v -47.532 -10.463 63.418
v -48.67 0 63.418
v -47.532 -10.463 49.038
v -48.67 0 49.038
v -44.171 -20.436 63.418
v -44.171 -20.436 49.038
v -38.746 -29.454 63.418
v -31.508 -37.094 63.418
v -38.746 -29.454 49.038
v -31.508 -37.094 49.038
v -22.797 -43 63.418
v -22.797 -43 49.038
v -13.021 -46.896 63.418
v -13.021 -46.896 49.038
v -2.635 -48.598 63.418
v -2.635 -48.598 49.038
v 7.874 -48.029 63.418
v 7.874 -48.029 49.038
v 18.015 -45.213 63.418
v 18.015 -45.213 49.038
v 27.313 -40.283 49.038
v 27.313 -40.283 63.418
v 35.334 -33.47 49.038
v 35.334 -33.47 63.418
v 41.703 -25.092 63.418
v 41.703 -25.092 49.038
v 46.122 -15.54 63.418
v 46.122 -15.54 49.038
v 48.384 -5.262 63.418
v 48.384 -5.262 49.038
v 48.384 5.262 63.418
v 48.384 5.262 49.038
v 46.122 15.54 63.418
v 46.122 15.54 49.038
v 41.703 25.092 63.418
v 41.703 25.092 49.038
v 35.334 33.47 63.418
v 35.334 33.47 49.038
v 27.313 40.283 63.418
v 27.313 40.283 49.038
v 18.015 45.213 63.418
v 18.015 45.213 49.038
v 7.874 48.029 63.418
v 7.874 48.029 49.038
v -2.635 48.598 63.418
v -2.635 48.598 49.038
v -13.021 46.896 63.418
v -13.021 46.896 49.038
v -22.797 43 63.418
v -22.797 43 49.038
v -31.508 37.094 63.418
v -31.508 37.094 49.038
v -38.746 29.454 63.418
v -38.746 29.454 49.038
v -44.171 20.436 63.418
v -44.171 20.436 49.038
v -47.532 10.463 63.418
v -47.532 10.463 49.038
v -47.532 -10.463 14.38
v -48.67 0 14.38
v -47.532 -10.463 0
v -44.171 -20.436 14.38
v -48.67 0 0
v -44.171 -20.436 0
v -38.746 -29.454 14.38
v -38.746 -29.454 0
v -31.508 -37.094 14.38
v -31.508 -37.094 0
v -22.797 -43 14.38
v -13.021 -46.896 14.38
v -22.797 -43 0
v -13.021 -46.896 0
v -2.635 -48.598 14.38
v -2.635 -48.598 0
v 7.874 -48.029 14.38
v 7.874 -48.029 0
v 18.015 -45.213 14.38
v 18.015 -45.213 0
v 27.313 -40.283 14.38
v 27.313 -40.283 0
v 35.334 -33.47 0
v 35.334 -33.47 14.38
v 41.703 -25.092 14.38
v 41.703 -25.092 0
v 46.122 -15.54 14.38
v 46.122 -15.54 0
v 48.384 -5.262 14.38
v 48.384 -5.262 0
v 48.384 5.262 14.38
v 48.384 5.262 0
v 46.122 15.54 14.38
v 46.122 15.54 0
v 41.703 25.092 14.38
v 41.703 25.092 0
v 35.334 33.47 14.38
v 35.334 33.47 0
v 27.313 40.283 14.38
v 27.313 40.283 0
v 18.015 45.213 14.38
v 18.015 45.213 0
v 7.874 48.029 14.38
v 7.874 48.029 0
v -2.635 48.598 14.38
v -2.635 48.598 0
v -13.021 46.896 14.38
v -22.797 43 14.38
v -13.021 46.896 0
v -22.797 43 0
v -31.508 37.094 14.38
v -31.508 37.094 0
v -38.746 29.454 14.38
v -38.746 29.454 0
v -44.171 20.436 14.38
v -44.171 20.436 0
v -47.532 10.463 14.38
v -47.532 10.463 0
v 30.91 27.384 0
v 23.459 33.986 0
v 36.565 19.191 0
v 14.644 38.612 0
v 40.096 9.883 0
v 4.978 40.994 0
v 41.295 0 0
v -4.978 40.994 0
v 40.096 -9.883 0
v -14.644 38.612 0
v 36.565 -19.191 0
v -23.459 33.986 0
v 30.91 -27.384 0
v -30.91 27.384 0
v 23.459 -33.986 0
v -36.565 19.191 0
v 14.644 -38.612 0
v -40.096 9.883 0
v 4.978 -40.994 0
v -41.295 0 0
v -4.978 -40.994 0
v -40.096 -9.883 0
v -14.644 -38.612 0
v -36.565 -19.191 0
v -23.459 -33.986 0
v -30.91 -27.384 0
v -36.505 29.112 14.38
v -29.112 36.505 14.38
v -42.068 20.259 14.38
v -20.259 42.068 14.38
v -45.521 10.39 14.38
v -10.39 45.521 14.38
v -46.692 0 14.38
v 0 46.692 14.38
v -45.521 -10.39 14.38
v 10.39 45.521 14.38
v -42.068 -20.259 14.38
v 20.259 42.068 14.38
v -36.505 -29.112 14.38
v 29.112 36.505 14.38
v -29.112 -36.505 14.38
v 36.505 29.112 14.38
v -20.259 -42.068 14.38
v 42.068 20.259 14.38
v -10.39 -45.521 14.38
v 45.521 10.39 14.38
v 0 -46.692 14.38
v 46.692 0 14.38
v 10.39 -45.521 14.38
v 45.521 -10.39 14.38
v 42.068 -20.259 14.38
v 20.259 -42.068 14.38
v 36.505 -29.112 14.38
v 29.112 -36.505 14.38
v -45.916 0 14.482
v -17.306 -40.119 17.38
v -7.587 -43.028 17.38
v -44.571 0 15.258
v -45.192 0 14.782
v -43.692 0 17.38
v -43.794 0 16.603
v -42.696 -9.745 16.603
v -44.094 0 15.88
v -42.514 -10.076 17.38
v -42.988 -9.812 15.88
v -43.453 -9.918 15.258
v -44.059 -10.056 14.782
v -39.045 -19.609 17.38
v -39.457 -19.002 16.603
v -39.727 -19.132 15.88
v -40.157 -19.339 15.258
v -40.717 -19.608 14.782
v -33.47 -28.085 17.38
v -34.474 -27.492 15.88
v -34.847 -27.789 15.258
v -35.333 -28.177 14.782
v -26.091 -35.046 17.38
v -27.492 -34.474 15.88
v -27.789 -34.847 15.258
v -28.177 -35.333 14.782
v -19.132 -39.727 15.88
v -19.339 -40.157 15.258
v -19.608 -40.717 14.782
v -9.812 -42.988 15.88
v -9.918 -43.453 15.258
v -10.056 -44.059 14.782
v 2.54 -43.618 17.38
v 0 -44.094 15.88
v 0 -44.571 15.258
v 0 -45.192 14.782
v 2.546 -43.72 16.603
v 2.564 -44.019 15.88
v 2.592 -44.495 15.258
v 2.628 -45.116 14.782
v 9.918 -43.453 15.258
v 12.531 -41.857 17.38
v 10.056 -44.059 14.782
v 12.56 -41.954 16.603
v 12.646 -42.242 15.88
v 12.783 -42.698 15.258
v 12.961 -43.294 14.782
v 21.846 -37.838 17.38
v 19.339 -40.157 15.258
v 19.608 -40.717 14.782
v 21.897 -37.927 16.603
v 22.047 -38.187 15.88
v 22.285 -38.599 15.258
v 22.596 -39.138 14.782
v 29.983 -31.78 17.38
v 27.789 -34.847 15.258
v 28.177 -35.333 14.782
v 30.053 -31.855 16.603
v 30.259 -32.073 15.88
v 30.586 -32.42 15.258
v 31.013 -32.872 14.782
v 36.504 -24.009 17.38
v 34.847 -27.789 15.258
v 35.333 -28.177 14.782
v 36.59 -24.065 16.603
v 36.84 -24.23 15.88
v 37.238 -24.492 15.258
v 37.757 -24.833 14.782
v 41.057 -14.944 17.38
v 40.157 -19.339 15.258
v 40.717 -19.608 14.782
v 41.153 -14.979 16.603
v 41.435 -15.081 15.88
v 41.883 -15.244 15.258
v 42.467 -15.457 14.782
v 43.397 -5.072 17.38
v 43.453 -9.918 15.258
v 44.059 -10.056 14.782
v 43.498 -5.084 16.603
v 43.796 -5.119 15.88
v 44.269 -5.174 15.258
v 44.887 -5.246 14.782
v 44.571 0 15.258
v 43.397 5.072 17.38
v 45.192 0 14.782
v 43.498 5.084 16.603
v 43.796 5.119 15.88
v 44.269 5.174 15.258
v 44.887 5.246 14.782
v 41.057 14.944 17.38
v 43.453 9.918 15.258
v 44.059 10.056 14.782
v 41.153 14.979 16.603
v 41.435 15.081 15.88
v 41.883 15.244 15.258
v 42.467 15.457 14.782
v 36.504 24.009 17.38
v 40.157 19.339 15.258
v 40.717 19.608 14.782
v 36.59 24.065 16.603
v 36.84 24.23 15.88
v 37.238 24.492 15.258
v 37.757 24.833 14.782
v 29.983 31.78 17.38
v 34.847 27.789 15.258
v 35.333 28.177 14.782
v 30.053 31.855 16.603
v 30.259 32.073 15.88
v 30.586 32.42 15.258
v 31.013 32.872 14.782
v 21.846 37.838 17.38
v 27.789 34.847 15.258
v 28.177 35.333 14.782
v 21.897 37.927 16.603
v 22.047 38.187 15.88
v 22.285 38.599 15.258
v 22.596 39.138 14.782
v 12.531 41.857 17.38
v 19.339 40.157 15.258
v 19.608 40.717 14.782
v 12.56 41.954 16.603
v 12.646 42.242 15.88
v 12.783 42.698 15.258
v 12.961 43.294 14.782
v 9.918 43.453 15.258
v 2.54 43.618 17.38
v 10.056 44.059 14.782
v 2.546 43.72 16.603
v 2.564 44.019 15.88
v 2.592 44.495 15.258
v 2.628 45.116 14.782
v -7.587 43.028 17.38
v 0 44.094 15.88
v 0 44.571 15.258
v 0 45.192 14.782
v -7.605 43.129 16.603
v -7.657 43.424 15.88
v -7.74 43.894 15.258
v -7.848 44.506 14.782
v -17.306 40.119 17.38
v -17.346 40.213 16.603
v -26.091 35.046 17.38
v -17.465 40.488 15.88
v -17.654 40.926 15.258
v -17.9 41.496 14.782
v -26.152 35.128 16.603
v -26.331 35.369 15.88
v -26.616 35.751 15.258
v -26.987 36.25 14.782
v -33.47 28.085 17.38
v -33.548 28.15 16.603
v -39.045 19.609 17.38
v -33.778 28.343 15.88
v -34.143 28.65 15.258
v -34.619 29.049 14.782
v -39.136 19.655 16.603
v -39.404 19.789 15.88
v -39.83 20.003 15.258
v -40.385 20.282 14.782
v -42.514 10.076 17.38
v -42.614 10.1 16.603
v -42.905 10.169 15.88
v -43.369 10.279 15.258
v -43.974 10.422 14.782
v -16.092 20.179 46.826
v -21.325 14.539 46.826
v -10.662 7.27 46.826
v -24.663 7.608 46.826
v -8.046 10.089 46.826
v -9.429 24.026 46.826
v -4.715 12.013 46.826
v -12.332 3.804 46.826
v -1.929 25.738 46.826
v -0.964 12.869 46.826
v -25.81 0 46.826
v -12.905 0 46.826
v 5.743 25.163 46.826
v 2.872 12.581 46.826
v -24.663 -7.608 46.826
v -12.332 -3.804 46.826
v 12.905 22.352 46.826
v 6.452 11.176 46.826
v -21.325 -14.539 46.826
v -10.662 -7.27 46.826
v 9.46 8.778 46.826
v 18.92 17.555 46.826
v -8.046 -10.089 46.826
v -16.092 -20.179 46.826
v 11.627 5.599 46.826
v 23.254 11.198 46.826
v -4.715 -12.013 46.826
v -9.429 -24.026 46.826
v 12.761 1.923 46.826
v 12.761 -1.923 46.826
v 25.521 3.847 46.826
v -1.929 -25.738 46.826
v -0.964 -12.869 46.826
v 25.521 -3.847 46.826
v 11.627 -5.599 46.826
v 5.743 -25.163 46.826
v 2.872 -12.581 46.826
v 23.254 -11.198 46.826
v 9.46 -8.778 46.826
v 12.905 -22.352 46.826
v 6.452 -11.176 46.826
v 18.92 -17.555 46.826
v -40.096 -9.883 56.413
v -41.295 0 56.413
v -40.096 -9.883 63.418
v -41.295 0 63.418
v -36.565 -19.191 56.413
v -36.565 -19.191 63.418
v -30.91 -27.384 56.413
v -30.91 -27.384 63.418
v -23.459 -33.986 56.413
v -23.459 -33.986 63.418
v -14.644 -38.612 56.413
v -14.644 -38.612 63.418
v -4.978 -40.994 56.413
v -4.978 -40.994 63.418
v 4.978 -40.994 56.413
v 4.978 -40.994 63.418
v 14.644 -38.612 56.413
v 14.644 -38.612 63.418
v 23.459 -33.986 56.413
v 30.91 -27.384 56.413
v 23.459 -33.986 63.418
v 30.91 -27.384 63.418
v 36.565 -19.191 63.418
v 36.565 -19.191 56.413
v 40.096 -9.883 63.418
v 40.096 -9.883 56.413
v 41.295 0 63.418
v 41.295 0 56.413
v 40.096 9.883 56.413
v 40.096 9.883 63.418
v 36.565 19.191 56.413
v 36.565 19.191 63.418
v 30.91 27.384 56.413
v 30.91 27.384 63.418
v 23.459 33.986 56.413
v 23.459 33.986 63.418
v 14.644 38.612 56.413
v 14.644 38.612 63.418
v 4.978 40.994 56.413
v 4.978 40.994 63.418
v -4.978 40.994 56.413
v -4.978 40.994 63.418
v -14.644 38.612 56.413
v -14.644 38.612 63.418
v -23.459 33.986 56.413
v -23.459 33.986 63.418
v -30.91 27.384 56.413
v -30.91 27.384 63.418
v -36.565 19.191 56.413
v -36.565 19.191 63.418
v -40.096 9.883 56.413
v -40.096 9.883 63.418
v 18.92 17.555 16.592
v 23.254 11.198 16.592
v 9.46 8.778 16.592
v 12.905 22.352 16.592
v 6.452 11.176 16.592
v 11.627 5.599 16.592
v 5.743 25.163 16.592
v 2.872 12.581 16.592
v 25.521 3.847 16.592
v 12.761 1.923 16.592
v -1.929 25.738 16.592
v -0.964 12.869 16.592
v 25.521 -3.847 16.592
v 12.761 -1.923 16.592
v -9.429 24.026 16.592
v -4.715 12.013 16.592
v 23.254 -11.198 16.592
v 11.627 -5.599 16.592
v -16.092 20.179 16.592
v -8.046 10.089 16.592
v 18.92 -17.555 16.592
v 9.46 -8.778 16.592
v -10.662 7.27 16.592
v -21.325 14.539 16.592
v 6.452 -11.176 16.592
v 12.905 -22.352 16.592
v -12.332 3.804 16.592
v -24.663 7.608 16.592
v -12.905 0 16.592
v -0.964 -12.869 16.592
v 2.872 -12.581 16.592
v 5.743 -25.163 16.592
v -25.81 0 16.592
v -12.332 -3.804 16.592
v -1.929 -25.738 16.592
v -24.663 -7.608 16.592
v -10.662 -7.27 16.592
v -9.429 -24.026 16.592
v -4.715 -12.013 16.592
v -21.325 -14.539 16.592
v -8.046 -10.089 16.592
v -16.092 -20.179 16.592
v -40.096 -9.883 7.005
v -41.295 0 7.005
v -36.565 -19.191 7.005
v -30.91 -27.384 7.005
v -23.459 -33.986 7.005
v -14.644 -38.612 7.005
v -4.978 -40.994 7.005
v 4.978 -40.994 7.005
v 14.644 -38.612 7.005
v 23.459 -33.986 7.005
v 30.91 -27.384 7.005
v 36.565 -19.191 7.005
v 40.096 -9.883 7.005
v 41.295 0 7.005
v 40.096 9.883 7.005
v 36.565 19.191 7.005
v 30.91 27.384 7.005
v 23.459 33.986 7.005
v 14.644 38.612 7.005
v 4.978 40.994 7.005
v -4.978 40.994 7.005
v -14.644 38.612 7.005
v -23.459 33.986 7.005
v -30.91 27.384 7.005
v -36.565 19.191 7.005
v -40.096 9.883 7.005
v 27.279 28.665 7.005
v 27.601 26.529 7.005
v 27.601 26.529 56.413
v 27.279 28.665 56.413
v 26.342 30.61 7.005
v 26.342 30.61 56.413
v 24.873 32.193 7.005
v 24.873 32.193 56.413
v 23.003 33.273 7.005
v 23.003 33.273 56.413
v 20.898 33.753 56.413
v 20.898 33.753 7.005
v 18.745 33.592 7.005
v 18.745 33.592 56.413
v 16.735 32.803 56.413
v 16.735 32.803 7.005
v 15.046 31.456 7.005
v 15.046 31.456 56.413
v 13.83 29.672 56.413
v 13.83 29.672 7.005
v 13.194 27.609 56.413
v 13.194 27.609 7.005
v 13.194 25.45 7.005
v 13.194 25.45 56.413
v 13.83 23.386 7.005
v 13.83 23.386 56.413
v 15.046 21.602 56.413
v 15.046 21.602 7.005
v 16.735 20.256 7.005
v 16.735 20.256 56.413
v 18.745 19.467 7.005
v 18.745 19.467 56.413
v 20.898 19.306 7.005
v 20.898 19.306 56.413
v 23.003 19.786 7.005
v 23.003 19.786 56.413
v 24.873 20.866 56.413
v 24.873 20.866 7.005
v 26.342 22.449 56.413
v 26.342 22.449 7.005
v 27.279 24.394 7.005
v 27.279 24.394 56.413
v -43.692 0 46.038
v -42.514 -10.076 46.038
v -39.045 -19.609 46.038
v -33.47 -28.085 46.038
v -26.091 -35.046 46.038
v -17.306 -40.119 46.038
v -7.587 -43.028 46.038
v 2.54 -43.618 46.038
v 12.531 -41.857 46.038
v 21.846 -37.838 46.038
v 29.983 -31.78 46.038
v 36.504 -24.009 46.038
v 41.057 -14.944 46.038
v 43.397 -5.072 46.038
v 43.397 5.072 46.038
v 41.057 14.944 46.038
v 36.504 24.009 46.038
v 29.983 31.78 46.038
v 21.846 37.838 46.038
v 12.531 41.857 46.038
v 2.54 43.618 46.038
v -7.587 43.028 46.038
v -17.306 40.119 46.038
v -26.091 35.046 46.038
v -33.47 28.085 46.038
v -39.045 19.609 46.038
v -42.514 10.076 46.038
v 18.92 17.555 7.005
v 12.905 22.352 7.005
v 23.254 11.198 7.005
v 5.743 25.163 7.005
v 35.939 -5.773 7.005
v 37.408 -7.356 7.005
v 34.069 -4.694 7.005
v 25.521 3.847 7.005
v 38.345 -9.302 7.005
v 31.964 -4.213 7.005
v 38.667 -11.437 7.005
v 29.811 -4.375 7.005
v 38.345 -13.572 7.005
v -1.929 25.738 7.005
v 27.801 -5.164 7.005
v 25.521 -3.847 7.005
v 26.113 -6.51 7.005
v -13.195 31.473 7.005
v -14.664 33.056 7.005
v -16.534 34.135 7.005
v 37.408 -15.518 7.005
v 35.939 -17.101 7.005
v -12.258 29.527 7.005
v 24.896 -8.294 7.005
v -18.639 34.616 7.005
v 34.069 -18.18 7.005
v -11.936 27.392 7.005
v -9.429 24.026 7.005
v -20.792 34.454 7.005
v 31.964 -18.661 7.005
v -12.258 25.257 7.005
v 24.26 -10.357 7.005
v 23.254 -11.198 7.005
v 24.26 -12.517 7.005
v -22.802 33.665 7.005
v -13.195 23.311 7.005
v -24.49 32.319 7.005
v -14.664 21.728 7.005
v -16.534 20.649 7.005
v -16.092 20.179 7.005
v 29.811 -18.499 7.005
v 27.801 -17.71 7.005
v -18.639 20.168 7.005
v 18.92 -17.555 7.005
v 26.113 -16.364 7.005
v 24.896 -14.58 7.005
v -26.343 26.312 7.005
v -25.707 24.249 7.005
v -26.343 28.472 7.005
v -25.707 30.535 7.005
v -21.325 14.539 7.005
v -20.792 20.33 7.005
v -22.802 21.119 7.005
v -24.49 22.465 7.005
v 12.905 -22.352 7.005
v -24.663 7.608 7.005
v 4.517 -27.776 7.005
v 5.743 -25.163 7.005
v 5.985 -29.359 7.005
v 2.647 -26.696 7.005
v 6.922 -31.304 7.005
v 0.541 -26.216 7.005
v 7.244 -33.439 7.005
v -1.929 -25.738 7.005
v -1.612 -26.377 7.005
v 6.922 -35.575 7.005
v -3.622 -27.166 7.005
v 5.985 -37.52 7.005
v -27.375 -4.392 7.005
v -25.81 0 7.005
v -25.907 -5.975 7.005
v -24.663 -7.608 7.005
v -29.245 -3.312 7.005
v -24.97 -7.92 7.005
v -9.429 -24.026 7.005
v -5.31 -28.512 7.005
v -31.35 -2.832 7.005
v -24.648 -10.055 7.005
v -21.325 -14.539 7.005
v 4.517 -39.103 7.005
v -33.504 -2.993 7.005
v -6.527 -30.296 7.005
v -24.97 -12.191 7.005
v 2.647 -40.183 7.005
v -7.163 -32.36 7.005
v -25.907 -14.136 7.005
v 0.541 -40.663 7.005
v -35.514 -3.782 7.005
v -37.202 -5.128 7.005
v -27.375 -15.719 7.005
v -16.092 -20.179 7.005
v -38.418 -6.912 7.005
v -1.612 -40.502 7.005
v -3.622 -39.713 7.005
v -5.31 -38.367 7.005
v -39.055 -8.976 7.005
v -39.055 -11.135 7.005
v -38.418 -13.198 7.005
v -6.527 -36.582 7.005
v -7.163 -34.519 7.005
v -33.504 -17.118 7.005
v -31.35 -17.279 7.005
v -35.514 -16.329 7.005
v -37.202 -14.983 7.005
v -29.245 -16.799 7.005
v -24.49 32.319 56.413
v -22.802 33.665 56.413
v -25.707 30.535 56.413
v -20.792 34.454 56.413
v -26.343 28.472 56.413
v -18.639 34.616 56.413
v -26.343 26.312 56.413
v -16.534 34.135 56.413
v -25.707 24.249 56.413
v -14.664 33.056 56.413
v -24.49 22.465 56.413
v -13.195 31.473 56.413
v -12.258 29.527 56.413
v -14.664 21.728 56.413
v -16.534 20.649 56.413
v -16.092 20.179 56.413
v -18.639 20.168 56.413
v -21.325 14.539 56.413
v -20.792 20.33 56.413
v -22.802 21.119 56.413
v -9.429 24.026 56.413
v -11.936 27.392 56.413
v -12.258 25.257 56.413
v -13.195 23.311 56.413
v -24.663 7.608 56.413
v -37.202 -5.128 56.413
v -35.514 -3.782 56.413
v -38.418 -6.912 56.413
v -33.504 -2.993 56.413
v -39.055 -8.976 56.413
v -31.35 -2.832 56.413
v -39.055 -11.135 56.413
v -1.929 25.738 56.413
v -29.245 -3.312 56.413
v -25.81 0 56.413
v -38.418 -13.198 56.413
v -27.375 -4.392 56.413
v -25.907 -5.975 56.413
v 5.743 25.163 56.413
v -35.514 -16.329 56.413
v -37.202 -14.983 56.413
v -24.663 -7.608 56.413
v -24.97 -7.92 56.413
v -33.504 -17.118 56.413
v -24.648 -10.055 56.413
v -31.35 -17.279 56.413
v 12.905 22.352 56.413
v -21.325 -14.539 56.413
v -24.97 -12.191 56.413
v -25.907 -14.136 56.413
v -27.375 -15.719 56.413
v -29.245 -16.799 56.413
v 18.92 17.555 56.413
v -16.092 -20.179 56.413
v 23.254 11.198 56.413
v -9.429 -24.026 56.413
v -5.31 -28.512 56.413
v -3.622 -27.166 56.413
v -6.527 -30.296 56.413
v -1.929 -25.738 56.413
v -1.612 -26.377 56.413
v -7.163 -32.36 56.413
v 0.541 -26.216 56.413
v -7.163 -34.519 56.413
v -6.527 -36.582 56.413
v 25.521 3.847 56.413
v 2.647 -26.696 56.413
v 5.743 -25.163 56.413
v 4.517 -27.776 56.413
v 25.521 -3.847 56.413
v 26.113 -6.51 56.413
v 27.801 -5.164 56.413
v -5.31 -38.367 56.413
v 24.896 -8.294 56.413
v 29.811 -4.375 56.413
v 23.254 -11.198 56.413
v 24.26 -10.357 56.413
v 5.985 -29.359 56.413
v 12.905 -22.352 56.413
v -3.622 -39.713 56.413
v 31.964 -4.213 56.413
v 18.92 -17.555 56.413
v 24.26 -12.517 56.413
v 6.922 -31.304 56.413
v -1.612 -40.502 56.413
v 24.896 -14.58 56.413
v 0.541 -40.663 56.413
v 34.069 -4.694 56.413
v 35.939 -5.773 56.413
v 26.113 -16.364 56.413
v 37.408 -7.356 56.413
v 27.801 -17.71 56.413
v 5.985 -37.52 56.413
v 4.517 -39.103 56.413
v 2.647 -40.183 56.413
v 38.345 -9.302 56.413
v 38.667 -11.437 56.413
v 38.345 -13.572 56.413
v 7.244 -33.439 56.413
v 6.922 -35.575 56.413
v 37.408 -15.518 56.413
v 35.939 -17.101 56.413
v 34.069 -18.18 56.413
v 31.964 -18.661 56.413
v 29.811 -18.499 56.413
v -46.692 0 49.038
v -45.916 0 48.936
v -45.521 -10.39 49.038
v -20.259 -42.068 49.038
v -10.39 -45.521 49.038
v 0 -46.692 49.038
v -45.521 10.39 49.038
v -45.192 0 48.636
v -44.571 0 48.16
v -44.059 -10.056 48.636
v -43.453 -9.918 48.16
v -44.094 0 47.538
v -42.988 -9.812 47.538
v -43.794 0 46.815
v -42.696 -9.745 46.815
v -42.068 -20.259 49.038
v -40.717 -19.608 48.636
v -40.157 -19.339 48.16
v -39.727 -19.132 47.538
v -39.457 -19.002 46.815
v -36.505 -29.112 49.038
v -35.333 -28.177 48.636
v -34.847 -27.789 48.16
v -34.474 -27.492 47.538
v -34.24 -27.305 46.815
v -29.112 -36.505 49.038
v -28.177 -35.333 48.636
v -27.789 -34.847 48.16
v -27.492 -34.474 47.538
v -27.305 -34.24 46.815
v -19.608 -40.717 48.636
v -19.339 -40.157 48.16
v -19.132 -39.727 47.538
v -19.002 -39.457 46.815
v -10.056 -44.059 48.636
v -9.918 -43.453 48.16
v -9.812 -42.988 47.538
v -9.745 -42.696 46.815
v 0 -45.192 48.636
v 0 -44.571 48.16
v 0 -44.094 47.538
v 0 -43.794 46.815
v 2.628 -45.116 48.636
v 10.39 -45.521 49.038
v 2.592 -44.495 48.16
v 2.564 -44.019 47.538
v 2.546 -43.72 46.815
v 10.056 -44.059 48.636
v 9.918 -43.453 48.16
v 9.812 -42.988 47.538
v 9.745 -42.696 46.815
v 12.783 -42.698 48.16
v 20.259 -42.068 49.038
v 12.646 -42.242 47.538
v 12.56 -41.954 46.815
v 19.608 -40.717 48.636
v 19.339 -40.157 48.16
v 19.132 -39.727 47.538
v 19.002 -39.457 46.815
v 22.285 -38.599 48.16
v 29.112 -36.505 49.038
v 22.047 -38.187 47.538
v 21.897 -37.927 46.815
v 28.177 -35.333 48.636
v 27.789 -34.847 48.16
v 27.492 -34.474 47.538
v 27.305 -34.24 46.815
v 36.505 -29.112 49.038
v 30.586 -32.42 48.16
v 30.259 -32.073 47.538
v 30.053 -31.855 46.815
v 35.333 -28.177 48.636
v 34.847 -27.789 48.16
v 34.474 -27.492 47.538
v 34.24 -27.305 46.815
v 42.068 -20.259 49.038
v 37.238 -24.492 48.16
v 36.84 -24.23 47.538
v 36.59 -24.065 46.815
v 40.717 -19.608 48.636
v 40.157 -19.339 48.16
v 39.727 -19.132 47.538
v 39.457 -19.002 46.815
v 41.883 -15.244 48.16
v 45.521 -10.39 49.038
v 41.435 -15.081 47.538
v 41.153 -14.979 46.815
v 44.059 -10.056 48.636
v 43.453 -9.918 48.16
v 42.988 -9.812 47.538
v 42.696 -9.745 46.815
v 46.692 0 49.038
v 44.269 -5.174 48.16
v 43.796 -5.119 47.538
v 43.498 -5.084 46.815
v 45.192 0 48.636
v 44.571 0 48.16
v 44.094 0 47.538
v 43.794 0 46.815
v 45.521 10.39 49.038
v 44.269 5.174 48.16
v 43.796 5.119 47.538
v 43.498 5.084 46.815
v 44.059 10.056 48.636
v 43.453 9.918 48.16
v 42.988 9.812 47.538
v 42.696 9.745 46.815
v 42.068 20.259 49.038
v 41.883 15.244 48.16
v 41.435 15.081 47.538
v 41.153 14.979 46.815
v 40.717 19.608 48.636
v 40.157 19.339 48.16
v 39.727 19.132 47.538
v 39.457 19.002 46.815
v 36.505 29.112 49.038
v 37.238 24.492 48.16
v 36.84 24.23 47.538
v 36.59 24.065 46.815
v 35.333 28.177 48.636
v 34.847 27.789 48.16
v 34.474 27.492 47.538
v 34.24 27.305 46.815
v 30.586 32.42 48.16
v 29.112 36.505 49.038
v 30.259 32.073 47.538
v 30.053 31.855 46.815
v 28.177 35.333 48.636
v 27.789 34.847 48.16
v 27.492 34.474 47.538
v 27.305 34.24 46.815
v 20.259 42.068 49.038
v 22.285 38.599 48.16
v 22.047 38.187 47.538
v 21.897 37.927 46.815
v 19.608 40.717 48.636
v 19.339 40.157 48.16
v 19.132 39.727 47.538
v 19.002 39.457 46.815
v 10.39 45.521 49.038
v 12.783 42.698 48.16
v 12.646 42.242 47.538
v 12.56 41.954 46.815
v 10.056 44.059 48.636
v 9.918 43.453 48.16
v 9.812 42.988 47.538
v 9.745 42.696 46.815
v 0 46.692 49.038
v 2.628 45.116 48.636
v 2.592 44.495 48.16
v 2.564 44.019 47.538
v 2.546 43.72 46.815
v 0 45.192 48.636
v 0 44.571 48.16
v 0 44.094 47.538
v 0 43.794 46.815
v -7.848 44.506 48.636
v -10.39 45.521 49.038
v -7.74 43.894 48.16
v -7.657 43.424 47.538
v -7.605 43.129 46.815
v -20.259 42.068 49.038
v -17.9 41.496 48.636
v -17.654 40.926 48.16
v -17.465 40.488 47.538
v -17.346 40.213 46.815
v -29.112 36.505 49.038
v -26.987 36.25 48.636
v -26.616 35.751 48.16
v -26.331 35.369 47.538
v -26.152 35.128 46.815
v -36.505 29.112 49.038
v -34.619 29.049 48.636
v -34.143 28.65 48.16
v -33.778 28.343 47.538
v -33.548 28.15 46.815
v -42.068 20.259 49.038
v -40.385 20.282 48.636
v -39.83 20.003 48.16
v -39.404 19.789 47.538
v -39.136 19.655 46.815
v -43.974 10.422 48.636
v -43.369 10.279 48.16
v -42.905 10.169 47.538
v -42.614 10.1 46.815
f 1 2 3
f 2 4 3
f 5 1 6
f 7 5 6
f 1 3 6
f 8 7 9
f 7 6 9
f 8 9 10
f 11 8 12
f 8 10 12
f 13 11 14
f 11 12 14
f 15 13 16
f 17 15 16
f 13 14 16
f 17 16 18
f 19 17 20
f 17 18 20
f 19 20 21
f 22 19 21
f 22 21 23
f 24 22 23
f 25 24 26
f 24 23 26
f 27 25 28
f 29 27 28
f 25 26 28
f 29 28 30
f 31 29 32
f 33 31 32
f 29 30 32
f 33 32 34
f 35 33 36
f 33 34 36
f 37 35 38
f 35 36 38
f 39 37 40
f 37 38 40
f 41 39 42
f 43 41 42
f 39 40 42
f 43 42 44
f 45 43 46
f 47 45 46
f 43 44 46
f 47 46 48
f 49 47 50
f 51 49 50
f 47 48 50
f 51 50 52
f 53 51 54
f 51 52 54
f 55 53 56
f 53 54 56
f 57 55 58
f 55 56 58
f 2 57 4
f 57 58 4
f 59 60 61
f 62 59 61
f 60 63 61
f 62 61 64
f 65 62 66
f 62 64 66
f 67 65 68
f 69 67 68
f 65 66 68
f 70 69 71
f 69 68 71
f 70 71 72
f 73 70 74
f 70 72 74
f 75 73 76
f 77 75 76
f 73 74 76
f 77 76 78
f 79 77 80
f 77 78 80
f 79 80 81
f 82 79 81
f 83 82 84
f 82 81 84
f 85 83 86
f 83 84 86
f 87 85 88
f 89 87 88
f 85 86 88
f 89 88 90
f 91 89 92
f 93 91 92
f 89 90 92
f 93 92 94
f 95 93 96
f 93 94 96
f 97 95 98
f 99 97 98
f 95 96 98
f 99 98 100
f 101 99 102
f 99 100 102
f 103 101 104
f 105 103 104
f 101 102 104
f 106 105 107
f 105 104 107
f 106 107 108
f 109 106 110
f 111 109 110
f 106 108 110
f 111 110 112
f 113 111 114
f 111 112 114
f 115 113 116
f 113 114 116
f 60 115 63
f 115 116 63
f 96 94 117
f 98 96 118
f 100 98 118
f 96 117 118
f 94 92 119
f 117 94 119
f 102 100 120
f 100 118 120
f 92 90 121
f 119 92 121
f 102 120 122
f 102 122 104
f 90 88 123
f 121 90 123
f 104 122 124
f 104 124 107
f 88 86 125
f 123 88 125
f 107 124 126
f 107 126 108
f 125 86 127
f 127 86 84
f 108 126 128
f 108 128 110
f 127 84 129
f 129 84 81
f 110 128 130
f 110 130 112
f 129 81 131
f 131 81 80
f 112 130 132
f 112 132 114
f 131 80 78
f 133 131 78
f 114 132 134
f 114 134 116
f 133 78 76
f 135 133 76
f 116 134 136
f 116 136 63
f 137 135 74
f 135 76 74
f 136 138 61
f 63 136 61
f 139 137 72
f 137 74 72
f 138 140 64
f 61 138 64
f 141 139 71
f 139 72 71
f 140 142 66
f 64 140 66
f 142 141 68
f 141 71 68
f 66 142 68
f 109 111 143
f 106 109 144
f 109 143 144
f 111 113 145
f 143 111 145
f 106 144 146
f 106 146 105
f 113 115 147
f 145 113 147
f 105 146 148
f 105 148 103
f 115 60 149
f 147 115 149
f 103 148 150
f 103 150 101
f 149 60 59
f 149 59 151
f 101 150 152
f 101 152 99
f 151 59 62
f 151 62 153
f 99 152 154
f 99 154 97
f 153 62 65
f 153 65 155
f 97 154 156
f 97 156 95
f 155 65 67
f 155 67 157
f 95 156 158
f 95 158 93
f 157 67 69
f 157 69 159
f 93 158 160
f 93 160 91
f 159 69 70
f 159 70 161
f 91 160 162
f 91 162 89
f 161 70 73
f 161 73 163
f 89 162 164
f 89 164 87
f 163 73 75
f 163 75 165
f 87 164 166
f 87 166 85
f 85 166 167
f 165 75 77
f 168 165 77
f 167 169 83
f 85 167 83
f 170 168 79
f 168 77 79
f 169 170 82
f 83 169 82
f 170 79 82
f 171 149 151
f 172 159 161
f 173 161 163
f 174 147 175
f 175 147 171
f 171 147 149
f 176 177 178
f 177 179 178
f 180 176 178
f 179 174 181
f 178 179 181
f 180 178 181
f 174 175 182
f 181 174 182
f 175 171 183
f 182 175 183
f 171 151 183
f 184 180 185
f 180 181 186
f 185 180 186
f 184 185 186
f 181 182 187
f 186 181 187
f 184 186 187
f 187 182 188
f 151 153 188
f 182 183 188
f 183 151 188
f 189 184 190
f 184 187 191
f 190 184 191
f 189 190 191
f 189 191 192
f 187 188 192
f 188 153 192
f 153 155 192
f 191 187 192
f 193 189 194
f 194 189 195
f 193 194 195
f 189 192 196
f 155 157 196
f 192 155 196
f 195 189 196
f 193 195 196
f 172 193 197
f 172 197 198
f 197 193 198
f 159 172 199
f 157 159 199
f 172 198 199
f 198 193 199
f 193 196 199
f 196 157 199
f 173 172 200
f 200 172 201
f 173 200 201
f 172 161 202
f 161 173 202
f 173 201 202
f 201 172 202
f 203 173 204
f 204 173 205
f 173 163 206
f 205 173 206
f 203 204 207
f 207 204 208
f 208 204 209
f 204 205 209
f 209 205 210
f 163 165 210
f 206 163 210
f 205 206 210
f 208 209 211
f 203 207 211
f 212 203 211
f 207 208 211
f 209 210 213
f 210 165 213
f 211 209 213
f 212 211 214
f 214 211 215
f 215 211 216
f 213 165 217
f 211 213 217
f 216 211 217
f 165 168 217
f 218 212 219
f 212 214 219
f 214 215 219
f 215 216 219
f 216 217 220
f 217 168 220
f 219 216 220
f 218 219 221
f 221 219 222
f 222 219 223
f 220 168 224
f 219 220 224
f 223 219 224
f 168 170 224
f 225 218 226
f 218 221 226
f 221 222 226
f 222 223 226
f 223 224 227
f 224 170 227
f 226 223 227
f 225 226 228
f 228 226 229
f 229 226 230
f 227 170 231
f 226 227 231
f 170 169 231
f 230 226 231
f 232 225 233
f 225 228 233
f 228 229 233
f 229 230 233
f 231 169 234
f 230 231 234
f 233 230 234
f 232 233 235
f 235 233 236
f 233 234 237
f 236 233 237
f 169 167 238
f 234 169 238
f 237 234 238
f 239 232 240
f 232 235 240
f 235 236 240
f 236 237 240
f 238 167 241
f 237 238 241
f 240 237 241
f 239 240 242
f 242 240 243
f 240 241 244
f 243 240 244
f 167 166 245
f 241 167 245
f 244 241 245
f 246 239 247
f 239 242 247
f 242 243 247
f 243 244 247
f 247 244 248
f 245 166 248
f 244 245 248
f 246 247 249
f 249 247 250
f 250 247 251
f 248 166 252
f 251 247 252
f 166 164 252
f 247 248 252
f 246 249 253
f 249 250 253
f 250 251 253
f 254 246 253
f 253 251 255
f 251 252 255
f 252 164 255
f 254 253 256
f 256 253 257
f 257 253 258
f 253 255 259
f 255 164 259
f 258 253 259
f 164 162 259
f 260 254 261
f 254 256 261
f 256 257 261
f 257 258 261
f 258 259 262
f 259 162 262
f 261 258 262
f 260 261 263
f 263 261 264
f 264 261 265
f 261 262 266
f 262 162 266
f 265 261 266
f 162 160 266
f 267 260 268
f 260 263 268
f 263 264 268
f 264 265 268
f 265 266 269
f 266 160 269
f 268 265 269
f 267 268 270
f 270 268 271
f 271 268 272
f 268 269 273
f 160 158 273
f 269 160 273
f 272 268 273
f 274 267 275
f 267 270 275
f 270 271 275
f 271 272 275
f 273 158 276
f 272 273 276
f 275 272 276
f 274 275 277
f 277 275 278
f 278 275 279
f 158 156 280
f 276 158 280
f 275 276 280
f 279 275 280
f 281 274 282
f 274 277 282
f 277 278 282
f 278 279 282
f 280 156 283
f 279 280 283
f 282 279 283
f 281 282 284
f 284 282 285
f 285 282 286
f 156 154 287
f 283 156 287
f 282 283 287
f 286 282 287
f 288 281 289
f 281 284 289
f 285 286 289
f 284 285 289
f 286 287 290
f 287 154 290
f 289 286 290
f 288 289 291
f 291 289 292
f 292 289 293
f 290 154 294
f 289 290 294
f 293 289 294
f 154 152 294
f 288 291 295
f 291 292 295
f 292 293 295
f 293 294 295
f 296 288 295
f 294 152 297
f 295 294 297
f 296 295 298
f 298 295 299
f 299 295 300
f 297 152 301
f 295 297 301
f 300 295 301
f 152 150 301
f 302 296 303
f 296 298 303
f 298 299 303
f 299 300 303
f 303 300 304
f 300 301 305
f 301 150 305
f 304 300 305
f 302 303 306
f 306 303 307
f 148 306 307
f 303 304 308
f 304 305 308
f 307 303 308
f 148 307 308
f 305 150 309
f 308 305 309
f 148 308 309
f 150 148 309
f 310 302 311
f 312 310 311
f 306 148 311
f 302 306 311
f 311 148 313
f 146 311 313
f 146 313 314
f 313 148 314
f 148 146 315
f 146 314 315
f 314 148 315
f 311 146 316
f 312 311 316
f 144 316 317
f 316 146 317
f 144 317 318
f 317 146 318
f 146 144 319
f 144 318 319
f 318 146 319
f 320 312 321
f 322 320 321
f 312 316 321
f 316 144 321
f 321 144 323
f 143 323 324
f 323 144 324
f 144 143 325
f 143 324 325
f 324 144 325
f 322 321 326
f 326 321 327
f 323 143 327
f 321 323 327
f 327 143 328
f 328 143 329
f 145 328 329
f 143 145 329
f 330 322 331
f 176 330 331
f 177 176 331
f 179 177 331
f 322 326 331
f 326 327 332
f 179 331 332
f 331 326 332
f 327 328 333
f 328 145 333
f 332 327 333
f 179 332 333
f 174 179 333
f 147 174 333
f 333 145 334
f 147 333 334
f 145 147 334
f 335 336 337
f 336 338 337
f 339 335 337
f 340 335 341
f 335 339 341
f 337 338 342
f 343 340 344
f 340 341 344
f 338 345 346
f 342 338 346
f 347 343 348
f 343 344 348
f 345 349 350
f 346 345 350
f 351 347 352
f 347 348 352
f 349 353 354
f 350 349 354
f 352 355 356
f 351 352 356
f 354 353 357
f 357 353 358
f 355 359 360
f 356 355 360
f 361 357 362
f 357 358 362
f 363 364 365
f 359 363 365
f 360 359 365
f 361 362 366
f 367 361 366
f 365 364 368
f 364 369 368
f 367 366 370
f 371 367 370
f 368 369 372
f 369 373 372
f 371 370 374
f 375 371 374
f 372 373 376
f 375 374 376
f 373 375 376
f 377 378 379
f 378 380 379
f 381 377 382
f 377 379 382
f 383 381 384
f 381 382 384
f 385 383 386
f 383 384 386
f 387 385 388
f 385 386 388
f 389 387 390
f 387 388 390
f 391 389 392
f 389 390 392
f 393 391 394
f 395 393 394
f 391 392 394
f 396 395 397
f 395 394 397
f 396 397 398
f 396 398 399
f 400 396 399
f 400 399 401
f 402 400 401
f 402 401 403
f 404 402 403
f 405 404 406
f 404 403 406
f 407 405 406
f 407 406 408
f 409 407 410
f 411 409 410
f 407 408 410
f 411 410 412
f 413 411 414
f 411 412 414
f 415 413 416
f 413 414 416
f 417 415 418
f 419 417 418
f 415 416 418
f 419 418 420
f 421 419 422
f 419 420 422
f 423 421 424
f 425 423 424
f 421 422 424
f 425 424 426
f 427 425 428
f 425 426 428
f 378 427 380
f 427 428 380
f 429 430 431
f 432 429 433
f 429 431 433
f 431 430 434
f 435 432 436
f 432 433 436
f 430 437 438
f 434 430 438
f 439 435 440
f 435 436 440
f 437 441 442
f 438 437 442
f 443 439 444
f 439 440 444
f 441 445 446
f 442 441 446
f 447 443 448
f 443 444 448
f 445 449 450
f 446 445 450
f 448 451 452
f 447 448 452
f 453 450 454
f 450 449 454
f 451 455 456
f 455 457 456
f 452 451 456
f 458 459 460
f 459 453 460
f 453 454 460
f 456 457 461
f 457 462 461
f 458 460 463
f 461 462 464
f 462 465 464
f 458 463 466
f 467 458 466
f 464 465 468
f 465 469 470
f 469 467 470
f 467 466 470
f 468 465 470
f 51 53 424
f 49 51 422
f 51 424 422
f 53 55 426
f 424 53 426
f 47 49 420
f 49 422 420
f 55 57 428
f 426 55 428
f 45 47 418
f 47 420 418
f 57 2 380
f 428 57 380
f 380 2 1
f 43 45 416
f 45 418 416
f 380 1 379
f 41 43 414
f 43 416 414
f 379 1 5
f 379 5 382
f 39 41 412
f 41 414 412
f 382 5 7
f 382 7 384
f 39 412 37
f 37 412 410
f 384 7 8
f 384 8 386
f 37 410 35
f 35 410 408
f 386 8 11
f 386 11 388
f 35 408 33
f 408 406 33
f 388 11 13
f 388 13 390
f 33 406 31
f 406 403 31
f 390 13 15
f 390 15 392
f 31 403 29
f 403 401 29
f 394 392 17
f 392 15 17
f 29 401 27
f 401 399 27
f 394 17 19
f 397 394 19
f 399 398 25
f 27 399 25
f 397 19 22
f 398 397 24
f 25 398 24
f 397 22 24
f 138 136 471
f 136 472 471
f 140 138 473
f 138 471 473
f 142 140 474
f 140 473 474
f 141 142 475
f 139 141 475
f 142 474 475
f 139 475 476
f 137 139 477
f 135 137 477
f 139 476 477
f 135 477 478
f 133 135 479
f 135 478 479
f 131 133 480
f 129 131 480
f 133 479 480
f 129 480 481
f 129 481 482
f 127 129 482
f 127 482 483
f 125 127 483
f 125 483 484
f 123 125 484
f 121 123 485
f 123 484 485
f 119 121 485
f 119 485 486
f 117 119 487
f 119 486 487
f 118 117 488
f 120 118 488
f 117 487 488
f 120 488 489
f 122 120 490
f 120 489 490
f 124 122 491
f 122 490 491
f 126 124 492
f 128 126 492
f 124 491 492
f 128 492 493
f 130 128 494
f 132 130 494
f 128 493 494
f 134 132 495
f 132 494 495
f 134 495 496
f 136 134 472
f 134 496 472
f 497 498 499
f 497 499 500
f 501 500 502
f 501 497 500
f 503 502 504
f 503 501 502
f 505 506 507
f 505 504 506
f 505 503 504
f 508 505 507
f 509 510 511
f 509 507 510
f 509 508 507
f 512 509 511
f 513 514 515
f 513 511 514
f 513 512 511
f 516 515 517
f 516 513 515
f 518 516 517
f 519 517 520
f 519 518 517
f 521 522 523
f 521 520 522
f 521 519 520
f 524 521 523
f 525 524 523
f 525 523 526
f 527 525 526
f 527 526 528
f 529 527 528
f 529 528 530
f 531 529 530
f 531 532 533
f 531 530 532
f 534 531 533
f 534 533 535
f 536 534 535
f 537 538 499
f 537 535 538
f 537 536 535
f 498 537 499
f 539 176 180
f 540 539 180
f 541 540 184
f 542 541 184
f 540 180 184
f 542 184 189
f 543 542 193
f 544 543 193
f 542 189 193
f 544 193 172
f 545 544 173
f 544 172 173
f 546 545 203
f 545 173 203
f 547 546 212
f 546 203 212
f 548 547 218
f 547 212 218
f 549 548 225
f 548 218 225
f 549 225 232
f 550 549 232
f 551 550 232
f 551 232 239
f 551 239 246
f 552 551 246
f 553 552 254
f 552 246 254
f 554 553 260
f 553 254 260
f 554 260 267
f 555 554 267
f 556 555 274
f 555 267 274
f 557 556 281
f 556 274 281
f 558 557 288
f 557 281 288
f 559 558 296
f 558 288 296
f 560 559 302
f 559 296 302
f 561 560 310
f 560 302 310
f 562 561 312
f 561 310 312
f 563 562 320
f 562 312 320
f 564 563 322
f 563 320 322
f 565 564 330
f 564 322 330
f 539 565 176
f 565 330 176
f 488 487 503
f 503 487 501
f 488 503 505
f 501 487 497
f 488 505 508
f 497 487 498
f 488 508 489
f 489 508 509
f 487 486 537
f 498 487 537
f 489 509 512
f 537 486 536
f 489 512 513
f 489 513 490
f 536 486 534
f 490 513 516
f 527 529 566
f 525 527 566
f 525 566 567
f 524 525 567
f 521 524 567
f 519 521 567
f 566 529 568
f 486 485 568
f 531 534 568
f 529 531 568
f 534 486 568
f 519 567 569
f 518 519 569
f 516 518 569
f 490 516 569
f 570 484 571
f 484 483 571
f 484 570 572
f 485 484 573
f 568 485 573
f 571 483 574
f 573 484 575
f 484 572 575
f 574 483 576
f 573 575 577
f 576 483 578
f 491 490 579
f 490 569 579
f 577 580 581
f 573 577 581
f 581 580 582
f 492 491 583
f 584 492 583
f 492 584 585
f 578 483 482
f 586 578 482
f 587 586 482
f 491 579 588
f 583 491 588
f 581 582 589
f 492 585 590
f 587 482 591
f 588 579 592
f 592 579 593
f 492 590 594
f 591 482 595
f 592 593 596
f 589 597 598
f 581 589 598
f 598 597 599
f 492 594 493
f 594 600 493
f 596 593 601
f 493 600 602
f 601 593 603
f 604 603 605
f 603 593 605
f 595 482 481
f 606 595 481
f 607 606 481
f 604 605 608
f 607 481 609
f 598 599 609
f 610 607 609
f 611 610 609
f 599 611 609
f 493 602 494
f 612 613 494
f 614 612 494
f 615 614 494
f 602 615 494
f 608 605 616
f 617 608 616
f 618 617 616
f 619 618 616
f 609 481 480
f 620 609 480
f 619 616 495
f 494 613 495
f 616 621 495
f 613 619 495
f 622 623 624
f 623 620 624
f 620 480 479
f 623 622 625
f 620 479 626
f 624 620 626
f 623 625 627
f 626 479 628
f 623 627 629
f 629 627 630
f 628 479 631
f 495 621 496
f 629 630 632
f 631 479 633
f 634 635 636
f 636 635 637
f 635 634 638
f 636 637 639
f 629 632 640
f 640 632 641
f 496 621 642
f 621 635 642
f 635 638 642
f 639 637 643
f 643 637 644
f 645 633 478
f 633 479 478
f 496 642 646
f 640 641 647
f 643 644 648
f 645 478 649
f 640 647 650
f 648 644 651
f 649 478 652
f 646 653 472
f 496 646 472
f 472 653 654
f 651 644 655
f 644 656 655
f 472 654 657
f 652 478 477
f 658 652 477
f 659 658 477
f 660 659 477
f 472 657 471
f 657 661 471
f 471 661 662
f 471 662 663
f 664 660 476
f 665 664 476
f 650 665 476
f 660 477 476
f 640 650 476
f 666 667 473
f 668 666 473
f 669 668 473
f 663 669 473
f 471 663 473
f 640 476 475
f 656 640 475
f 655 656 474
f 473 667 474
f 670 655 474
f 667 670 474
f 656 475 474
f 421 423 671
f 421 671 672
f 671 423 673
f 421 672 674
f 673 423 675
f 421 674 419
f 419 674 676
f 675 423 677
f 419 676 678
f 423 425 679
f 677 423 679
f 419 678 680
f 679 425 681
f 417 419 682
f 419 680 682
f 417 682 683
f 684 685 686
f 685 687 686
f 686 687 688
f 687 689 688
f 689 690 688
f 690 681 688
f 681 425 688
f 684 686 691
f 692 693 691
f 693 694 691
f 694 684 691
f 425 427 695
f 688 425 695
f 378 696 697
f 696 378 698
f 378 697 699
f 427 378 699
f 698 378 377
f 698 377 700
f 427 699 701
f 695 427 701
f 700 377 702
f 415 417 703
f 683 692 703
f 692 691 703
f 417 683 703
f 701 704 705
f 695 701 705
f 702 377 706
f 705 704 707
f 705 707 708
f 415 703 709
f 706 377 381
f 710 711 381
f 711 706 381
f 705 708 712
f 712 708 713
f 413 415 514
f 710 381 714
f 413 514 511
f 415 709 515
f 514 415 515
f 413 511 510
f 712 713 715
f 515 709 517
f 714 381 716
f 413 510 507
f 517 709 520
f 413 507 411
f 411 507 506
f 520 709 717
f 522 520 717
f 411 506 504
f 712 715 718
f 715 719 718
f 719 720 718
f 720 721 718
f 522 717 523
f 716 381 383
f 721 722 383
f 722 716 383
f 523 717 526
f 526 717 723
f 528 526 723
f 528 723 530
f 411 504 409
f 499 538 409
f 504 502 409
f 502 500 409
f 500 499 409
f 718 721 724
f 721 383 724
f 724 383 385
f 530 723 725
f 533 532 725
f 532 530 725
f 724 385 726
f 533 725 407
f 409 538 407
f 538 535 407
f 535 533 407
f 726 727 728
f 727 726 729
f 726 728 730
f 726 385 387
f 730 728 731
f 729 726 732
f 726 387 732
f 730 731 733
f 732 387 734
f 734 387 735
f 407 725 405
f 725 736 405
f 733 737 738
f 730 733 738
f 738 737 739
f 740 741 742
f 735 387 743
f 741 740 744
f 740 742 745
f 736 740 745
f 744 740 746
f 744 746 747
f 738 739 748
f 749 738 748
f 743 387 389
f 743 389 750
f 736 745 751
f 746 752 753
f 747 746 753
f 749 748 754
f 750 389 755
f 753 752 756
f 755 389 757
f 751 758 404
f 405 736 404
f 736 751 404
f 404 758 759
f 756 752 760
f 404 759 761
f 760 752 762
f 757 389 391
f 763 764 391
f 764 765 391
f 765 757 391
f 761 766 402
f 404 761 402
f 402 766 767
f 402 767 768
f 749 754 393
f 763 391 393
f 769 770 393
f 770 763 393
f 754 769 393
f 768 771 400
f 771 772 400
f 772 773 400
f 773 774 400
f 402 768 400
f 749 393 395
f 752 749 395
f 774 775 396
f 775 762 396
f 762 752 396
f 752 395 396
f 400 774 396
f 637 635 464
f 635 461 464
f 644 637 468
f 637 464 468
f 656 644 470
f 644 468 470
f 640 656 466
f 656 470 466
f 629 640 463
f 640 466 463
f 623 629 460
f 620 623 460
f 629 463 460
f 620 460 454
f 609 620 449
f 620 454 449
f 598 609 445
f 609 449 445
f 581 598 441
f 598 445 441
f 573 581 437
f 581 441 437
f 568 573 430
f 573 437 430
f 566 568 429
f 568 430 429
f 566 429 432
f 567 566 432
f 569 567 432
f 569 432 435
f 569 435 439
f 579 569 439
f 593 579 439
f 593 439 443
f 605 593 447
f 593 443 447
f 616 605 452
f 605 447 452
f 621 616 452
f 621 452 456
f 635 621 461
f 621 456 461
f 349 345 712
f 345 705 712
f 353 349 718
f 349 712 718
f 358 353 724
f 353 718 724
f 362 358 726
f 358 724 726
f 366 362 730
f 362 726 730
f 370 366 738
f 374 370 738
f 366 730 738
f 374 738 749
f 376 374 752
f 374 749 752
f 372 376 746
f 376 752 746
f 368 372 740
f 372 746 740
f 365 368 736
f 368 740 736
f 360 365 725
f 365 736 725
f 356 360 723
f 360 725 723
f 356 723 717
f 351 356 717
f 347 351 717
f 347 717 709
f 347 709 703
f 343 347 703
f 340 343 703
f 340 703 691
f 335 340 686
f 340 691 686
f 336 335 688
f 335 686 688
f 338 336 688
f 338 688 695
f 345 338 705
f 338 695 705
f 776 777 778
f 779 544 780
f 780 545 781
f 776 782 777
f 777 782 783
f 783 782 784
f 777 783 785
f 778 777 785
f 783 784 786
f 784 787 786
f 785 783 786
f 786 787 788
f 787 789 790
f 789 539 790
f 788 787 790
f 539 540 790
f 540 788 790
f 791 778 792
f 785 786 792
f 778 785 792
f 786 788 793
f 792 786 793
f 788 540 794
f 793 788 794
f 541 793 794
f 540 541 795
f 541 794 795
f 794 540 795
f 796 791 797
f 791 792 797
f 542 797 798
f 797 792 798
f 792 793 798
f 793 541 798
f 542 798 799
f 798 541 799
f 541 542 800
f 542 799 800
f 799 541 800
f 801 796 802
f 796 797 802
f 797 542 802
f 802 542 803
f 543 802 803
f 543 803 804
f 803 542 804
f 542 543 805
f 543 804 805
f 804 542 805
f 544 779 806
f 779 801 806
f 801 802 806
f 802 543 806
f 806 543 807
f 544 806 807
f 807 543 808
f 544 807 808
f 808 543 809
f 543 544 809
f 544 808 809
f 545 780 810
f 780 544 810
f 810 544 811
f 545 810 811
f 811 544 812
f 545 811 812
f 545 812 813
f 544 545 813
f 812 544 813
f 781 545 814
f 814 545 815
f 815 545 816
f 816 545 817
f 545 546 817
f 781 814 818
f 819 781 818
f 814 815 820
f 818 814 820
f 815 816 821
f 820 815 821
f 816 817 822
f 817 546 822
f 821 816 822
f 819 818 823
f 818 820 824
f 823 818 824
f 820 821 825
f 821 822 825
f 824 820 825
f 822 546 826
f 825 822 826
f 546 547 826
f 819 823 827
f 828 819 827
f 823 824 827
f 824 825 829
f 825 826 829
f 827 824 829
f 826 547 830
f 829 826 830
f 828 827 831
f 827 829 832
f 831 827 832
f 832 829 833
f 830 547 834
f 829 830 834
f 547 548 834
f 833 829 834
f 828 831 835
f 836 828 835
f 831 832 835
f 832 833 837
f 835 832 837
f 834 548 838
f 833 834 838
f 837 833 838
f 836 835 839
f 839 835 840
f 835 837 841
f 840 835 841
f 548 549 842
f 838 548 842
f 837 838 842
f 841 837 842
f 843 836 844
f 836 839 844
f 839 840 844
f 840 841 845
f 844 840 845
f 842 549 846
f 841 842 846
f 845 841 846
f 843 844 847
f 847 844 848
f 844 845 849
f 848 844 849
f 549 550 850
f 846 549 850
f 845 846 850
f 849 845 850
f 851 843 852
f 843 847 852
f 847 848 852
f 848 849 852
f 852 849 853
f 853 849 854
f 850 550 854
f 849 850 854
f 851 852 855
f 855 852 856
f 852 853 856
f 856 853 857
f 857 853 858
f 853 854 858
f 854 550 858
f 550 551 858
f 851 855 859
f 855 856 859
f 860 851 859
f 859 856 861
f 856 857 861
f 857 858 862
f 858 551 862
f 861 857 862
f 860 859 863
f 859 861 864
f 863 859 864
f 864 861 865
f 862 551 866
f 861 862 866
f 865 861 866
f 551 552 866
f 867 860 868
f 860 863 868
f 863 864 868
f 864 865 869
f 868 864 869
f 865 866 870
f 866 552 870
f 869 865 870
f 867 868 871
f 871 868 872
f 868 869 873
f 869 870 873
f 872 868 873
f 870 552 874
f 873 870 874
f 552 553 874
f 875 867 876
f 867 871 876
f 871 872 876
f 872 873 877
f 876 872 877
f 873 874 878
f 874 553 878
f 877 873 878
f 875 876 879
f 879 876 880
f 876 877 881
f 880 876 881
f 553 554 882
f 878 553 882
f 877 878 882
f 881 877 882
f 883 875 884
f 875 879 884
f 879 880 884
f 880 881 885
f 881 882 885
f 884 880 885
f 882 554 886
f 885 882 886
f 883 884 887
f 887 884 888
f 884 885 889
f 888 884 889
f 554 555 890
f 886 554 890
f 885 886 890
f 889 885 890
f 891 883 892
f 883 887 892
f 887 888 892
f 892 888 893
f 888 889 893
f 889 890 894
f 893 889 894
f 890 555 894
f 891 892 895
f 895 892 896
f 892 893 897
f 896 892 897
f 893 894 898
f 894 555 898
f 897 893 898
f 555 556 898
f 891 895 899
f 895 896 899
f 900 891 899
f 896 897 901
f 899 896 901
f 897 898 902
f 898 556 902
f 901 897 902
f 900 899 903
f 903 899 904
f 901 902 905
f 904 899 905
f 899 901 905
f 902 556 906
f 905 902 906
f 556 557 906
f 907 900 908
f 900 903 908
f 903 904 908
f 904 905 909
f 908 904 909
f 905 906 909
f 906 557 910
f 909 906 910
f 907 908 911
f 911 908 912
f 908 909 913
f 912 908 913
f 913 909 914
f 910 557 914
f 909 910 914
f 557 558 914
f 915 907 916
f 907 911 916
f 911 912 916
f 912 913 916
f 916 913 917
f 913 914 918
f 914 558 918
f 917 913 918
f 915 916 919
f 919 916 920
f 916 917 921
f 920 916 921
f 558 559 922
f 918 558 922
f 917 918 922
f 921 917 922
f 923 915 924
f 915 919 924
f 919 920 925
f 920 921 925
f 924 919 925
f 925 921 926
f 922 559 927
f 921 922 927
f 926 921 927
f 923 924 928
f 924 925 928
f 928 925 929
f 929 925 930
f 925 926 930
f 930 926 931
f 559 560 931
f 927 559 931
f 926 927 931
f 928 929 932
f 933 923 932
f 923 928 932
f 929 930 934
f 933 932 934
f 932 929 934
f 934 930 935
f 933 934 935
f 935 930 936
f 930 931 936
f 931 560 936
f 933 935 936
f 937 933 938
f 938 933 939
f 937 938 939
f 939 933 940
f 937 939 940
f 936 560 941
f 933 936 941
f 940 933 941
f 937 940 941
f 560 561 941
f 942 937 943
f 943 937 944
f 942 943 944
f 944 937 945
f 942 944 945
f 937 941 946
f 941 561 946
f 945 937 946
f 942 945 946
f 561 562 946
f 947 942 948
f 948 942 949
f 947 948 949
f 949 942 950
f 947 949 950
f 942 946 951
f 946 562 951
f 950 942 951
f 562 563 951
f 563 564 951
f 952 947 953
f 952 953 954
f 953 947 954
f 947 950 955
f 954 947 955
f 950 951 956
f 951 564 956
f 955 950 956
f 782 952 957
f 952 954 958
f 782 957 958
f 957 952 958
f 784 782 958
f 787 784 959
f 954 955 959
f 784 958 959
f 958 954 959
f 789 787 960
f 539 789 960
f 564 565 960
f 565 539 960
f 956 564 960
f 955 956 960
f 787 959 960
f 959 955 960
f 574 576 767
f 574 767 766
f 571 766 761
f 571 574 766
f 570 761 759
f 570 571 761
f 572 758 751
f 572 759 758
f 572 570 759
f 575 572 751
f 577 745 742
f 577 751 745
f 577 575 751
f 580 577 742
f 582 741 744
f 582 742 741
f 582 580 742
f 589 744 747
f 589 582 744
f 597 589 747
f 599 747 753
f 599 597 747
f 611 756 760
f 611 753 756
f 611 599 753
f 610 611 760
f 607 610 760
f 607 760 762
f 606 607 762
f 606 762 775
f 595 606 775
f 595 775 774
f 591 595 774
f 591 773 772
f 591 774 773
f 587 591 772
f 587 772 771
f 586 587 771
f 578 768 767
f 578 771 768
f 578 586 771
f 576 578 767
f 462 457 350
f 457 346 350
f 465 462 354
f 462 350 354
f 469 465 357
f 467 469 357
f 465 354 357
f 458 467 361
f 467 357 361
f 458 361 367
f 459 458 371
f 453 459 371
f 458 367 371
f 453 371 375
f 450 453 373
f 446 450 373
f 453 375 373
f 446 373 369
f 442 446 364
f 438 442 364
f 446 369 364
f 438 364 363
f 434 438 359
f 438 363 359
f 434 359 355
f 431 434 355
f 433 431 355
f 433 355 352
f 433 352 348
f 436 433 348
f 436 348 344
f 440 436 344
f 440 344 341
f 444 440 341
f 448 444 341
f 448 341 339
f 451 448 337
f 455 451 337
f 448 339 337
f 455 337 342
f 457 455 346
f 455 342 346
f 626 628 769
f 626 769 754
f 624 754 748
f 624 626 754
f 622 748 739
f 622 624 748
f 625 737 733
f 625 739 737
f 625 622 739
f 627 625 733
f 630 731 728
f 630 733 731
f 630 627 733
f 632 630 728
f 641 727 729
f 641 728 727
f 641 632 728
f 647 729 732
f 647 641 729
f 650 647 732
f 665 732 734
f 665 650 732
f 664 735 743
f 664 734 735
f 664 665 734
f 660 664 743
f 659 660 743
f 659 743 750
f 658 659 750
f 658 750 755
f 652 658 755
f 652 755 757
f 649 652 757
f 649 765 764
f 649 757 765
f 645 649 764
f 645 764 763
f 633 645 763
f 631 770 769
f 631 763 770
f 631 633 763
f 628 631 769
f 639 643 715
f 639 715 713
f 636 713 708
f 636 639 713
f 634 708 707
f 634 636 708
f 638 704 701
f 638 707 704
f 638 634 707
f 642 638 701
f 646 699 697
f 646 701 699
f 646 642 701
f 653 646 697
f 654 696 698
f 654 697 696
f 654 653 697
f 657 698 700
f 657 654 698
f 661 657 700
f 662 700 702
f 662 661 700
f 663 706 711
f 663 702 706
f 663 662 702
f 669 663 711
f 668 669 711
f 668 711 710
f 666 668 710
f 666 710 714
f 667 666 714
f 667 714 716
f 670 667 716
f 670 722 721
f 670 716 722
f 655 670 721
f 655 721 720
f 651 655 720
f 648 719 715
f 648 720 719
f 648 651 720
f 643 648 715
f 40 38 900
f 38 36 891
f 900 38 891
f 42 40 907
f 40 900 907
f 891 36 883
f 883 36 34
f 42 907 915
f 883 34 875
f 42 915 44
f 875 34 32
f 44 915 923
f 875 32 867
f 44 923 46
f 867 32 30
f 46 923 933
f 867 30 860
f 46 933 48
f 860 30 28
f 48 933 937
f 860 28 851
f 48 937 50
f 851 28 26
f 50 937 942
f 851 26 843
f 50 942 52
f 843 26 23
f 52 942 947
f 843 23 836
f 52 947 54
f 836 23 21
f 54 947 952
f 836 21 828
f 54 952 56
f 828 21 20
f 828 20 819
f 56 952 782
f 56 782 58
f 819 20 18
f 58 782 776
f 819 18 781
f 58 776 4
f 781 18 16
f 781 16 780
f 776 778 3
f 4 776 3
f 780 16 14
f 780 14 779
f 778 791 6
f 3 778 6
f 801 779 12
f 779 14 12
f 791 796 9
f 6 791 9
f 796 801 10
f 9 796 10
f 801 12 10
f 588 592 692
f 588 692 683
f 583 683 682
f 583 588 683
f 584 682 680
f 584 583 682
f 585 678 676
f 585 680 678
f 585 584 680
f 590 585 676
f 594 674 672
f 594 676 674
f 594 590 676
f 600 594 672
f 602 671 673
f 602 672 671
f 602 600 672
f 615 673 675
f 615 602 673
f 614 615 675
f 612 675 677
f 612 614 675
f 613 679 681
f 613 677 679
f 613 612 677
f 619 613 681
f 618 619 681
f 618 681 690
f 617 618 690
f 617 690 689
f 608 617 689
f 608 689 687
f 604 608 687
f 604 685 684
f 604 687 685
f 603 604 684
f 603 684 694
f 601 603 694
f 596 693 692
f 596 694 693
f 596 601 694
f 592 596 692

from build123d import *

# Parameters (mm, degrees)
F2_R     = 3
F3_R     = 3
F4_R     = 7.243967
F5_DEPTH = 105.41


with BuildPart() as f1:
    # F0 (on Front) → F1 (revolve)
    with BuildSketch(Plane.XZ):
        Polygon((-12.904838, 16.591936), (-12.904838, 31.709034), (-12.904838, 46.826132), (-25.809675, 46.826132), (-25.809675, 56.412581), (-41.295484, 56.412581), (-41.295484, 63.418068), (-48.669677, 63.418068), (-48.669677, 49.038392), (-43.692097, 49.038392), (-43.692097, 31.709034), (-43.692097, 14.379676), (-48.669677, 14.379676), (-48.669677, 0), (-41.295484, 0), (-41.295484, 7.005487), (-25.809675, 7.005487), (-25.809675, 16.591936), align=None)
    revolve(axis=Axis((0, 0, 52.264599), (0, 0, 1)))

    # F2
    f2_edges = [f1.edges().sort_by_distance(p)[0] for p in [
        (43.692097, 0, 49.038392),
    ]]
    fillet(f2_edges, radius=F2_R)

    # F3
    f3_edges = [f1.edges().sort_by_distance(p)[0] for p in [
        (43.692097, 0, 14.379676),
    ]]
    fillet(f3_edges, radius=F3_R)

    # F4 (on Top) → F5 (cut)
    with BuildSketch(Plane.XY):
        with Locations((0, -33.43946)):
            Circle(F4_R)
        with Locations((-31.89178, -10.055439)):
            Circle(F4_R)
        with Locations((-19.180086, 27.392002)):
            Circle(F4_R)
        with Locations((20.356653, 26.529307)):
            Circle(F4_R)
        with Locations((31.422813, -11.436969)):
            Circle(F4_R)
    extrude(amount=F5_DEPTH, mode=Mode.SUBTRACT)


solid = f1.part
